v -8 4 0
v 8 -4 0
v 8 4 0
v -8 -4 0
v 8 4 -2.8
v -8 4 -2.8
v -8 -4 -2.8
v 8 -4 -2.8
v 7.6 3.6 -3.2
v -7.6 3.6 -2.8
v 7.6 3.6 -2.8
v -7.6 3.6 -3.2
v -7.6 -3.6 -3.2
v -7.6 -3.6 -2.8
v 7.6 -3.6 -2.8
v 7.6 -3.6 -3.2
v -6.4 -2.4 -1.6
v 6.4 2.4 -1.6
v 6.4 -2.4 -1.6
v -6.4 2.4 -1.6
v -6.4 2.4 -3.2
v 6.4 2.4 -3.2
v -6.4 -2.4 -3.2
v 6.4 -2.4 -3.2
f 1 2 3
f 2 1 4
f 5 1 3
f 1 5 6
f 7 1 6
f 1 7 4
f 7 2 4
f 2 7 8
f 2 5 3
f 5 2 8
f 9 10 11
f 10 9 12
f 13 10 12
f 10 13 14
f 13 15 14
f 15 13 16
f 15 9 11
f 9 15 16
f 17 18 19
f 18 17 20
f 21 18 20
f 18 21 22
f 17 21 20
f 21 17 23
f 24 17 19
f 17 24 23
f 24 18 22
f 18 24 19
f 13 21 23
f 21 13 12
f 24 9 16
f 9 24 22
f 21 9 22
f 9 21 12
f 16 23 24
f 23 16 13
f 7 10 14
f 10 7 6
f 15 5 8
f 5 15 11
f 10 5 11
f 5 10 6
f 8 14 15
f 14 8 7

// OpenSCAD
// file: ../p/4-4edge.scad
use <../lib.scad>
$fa=1; $fs=0.2;
function ldraw_lib__4_4edge(realsolid=false) = [
// 0 Circle 1.0
// 0 Name: 4-4edge.dat
// 0 Author: James Jessiman
// 0 !LDRAW_ORG Primitive UPDATE 2017-01
// 0 !LICENSE Licensed under CC BY 2.0 and CC BY 4.0 : see CAreadme.txt
// 
// 0 BFC CERTIFY CCW
  [0,"BFC","CERTIFY"],
  [0,"BFC","CCW"],
// 
// 0 !HISTORY 1998-12-15 [PTadmin] Official Update 1998-10
// 0 !HISTORY 2005-12-28 [PTadmin] Official Update 2005-01
// 0 !HISTORY 2007-06-24 [PTadmin] Header formatted for Contributor Agreement
// 0 !HISTORY 2008-07-01 [PTadmin] Official Update 2008-01
// 0 !HISTORY 2017-01-15 [Steffen] BFCed
// 0 !HISTORY 2017-12-30 [PTadmin] Official Update 2017-01
// 
// 
// 2 24 1 0 0 0.9239 0 0.3827
  [2,24,1,0,0,0.9239,0,0.3827],
// 2 24 0.9239 0 0.3827 0.7071 0 0.7071
  [2,24,0.9239,0,0.3827,0.7071,0,0.7071],
// 2 24 0.7071 0 0.7071 0.3827 0 0.9239
  [2,24,0.7071,0,0.7071,0.3827,0,0.9239],
// 2 24 0.3827 0 0.9239 0 0 1
  [2,24,0.3827,0,0.9239,0,0,1],
// 2 24 0 0 1 -0.3827 0 0.9239
  [2,24,0,0,1,-0.3827,0,0.9239],
// 2 24 -0.3827 0 0.9239 -0.7071 0 0.7071
  [2,24,-0.3827,0,0.9239,-0.7071,0,0.7071],
// 2 24 -0.7071 0 0.7071 -0.9239 0 0.3827
  [2,24,-0.7071,0,0.7071,-0.9239,0,0.3827],
// 2 24 -0.9239 0 0.3827 -1 0 -0
  [2,24,-0.9239,0,0.3827,-1,0,-0],
// 2 24 -1 0 -0 -0.9239 0 -0.3827
  [2,24,-1,0,-0,-0.9239,0,-0.3827],
// 2 24 -0.9239 0 -0.3827 -0.7071 0 -0.7071
  [2,24,-0.9239,0,-0.3827,-0.7071,0,-0.7071],
// 2 24 -0.7071 0 -0.7071 -0.3827 0 -0.9239
  [2,24,-0.7071,0,-0.7071,-0.3827,0,-0.9239],
// 2 24 -0.3827 0 -0.9239 0 0 -1
  [2,24,-0.3827,0,-0.9239,0,0,-1],
// 2 24 0 0 -1 0.3827 0 -0.9239
  [2,24,0,0,-1,0.3827,0,-0.9239],
// 2 24 0.3827 0 -0.9239 0.7071 0 -0.7071
  [2,24,0.3827,0,-0.9239,0.7071,0,-0.7071],
// 2 24 0.7071 0 -0.7071 0.9239 0 -0.3827
  [2,24,0.7071,0,-0.7071,0.9239,0,-0.3827],
// 2 24 0.9239 0 -0.3827 1 0 0
  [2,24,0.9239,0,-0.3827,1,0,0],
];
module ldraw_lib__4_4edge(step=0, col=false, unit=2/5, alt=false, line=0.2, solid=!$preview)
    makepoly(ldraw_lib__4_4edge(solid), step=step, col=col, unit=unit, alt=alt, line=line, solid=solid);
ldraw_lib__4_4edge(line=0.2);
// file: ../p/4-4disc.scad
use <../lib.scad>
$fa=1; $fs=0.2;
function ldraw_lib__4_4disc(realsolid=false) = [
// 0 Disc 1.0
// 0 Name: 4-4disc.dat
// 0 Author: James Jessiman
// 0 !LDRAW_ORG Primitive UPDATE 2002-02
// 0 !LICENSE Licensed under CC BY 2.0 and CC BY 4.0 : see CAreadme.txt
// 
// 0 BFC CERTIFY CCW
  [0,"BFC","CERTIFY"],
  [0,"BFC","CCW"],
// 
// 0 !HISTORY 1998-12-15 [PTadmin] Official Update 1998-10
// 0 !HISTORY 2002-03-23 [sbliss] Added BFC statement
// 0 !HISTORY 2002-04-25 [PTadmin] Official Update 2002-02
// 0 !HISTORY 2007-06-24 [PTadmin] Header formatted for Contributor Agreement
// 0 !HISTORY 2008-07-01 [PTadmin] Official Update 2008-01
// 
// 
// 3 16 0 0 0 1 0 0 0.9239 0 0.3827
  [3,16,0,0,0,1,0,0,0.9239,0,0.3827],
// 3 16 0 0 0 0.9239 0 0.3827 0.7071 0 0.7071
  [3,16,0,0,0,0.9239,0,0.3827,0.7071,0,0.7071],
// 3 16 0 0 0 0.7071 0 0.7071 0.3827 0 0.9239
  [3,16,0,0,0,0.7071,0,0.7071,0.3827,0,0.9239],
// 3 16 0 0 0 0.3827 0 0.9239 0 0 1
  [3,16,0,0,0,0.3827,0,0.9239,0,0,1],
// 3 16 0 0 0 0 0 1 -0.3827 0 0.9239
  [3,16,0,0,0,0,0,1,-0.3827,0,0.9239],
// 3 16 0 0 0 -0.3827 0 0.9239 -0.7071 0 0.7071
  [3,16,0,0,0,-0.3827,0,0.9239,-0.7071,0,0.7071],
// 3 16 0 0 0 -0.7071 0 0.7071 -0.9239 0 0.3827
  [3,16,0,0,0,-0.7071,0,0.7071,-0.9239,0,0.3827],
// 3 16 0 0 0 -0.9239 0 0.3827 -1 0 -0
  [3,16,0,0,0,-0.9239,0,0.3827,-1,0,-0],
// 3 16 0 0 0 -1 0 -0 -0.9239 0 -0.3827
  [3,16,0,0,0,-1,0,-0,-0.9239,0,-0.3827],
// 3 16 0 0 0 -0.9239 0 -0.3827 -0.7071 0 -0.7071
  [3,16,0,0,0,-0.9239,0,-0.3827,-0.7071,0,-0.7071],
// 3 16 0 0 0 -0.7071 0 -0.7071 -0.3827 0 -0.9239
  [3,16,0,0,0,-0.7071,0,-0.7071,-0.3827,0,-0.9239],
// 3 16 0 0 0 -0.3827 0 -0.9239 0 0 -1
  [3,16,0,0,0,-0.3827,0,-0.9239,0,0,-1],
// 3 16 0 0 0 0 0 -1 0.3827 0 -0.9239
  [3,16,0,0,0,0,0,-1,0.3827,0,-0.9239],
// 3 16 0 0 0 0.3827 0 -0.9239 0.7071 0 -0.7071
  [3,16,0,0,0,0.3827,0,-0.9239,0.7071,0,-0.7071],
// 3 16 0 0 0 0.7071 0 -0.7071 0.9239 0 -0.3827
  [3,16,0,0,0,0.7071,0,-0.7071,0.9239,0,-0.3827],
// 3 16 0 0 0 0.9239 0 -0.3827 1 0 0
  [3,16,0,0,0,0.9239,0,-0.3827,1,0,0],
// 0
];
module ldraw_lib__4_4disc(step=0, col=false, unit=2/5, alt=false, line=0.2, solid=!$preview)
    makepoly(ldraw_lib__4_4disc(solid), step=step, col=col, unit=unit, alt=alt, line=line, solid=solid);
ldraw_lib__4_4disc(line=0.2);
// file: ../p/4-4cyli.scad
use <../lib.scad>
$fa=1; $fs=0.2;
function ldraw_lib__4_4cyli(realsolid=false) = [
// 0 Cylinder 1.0
// 0 Name: 4-4cyli.dat
// 0 Author: James Jessiman
// 0 !LDRAW_ORG Primitive UPDATE 2005-01
// 0 !LICENSE Licensed under CC BY 2.0 and CC BY 4.0 : see CAreadme.txt
// 
// 0 BFC CERTIFY CCW
  [0,"BFC","CERTIFY"],
  [0,"BFC","CCW"],
// 
// 0 !HISTORY 1998-12-15 [PTadmin] Official Update 1998-10
// 0 !HISTORY 2002-03-23 [sbliss] Added BFC statement; merged headers from files in distributions LDraw 0.27 and Complete.
// 0 !HISTORY 2002-04-25 [PTadmin] Official Update 2002-02
// 0 !HISTORY 2004-12-14 [guyvivan] BFC CCW
// 0 !HISTORY 2005-12-28 [PTadmin] Official Update 2005-01
// 0 !HISTORY 2007-06-24 [PTadmin] Header formatted for Contributor Agreement
// 0 !HISTORY 2008-07-01 [PTadmin] Official Update 2008-01
// 
// 
// 4 16 1 1 0 0.9239 1 0.3827 0.9239 0 0.3827 1 0 0
  [4,16,1,1,0,0.9239,1,0.3827,0.9239,0,0.3827,1,0,0],
// 5 24 1 0 0 1 1 0 0.9239 0 0.3827 0.9239 0 -0.3827
  [5,24,1,0,0,1,1,0,0.9239,0,0.3827,0.9239,0,-0.3827],
// 4 16 0.9239 1 0.3827 0.7071 1 0.7071 0.7071 0 0.7071 0.9239 0 0.3827
  [4,16,0.9239,1,0.3827,0.7071,1,0.7071,0.7071,0,0.7071,0.9239,0,0.3827],
// 5 24 0.9239 0 0.3827 0.9239 1 0.3827 0.7071 0 0.7071 1 0 0
  [5,24,0.9239,0,0.3827,0.9239,1,0.3827,0.7071,0,0.7071,1,0,0],
// 4 16 0.7071 1 0.7071 0.3827 1 0.9239 0.3827 0 0.9239 0.7071 0 0.7071
  [4,16,0.7071,1,0.7071,0.3827,1,0.9239,0.3827,0,0.9239,0.7071,0,0.7071],
// 5 24 0.7071 0 0.7071 0.7071 1 0.7071 0.3827 0 0.9239 0.9239 0 0.3827
  [5,24,0.7071,0,0.7071,0.7071,1,0.7071,0.3827,0,0.9239,0.9239,0,0.3827],
// 4 16 0.3827 1 0.9239 0 1 1 0 0 1 0.3827 0 0.9239
  [4,16,0.3827,1,0.9239,0,1,1,0,0,1,0.3827,0,0.9239],
// 5 24 0.3827 0 0.9239 0.3827 1 0.9239 0 0 1 0.7071 0 0.7071
  [5,24,0.3827,0,0.9239,0.3827,1,0.9239,0,0,1,0.7071,0,0.7071],
// 4 16 0 1 1 -0.3827 1 0.9239 -0.3827 0 0.9239 0 0 1
  [4,16,0,1,1,-0.3827,1,0.9239,-0.3827,0,0.9239,0,0,1],
// 5 24 0 0 1 0 1 1 -0.3827 0 0.9239 0.3827 0 0.9239
  [5,24,0,0,1,0,1,1,-0.3827,0,0.9239,0.3827,0,0.9239],
// 4 16 -0.3827 1 0.9239 -0.7071 1 0.7071 -0.7071 0 0.7071 -0.3827 0 0.9239
  [4,16,-0.3827,1,0.9239,-0.7071,1,0.7071,-0.7071,0,0.7071,-0.3827,0,0.9239],
// 5 24 -0.3827 0 0.9239 -0.3827 1 0.9239 -0.7071 0 0.7071 0 0 1
  [5,24,-0.3827,0,0.9239,-0.3827,1,0.9239,-0.7071,0,0.7071,0,0,1],
// 4 16 -0.7071 1 0.7071 -0.9239 1 0.3827 -0.9239 0 0.3827 -0.7071 0 0.7071
  [4,16,-0.7071,1,0.7071,-0.9239,1,0.3827,-0.9239,0,0.3827,-0.7071,0,0.7071],
// 5 24 -0.7071 0 0.7071 -0.7071 1 0.7071 -0.9239 0 0.3827 -0.3827 0 0.9239
  [5,24,-0.7071,0,0.7071,-0.7071,1,0.7071,-0.9239,0,0.3827,-0.3827,0,0.9239],
// 4 16 -0.9239 1 0.3827 -1 1 0 -1 0 0 -0.9239 0 0.3827
  [4,16,-0.9239,1,0.3827,-1,1,0,-1,0,0,-0.9239,0,0.3827],
// 5 24 -0.9239 0 0.3827 -0.9239 1 0.3827 -1 0 0 -0.7071 0 0.7071
  [5,24,-0.9239,0,0.3827,-0.9239,1,0.3827,-1,0,0,-0.7071,0,0.7071],
// 4 16 -1 1 0 -0.9239 1 -0.3827 -0.9239 0 -0.3827 -1 0 0
  [4,16,-1,1,0,-0.9239,1,-0.3827,-0.9239,0,-0.3827,-1,0,0],
// 5 24 -1 0 0 -1 1 0 -0.9239 0 -0.3827 -0.9239 0 0.3827
  [5,24,-1,0,0,-1,1,0,-0.9239,0,-0.3827,-0.9239,0,0.3827],
// 4 16 -0.9239 1 -0.3827 -0.7071 1 -0.7071 -0.7071 0 -0.7071 -0.9239 0 -0.3827
  [4,16,-0.9239,1,-0.3827,-0.7071,1,-0.7071,-0.7071,0,-0.7071,-0.9239,0,-0.3827],
// 5 24 -0.9239 0 -0.3827 -0.9239 1 -0.3827 -0.7071 0 -0.7071 -1 0 0
  [5,24,-0.9239,0,-0.3827,-0.9239,1,-0.3827,-0.7071,0,-0.7071,-1,0,0],
// 4 16 -0.7071 1 -0.7071 -0.3827 1 -0.9239 -0.3827 0 -0.9239 -0.7071 0 -0.7071
  [4,16,-0.7071,1,-0.7071,-0.3827,1,-0.9239,-0.3827,0,-0.9239,-0.7071,0,-0.7071],
// 5 24 -0.7071 0 -0.7071 -0.7071 1 -0.7071 -0.3827 0 -0.9239 -0.9239 0 -0.3827
  [5,24,-0.7071,0,-0.7071,-0.7071,1,-0.7071,-0.3827,0,-0.9239,-0.9239,0,-0.3827],
// 4 16 -0.3827 1 -0.9239 0 1 -1 0 0 -1 -0.3827 0 -0.9239
  [4,16,-0.3827,1,-0.9239,0,1,-1,0,0,-1,-0.3827,0,-0.9239],
// 5 24 -0.3827 0 -0.9239 -0.3827 1 -0.9239 0 0 -1 -0.7071 0 -0.7071
  [5,24,-0.3827,0,-0.9239,-0.3827,1,-0.9239,0,0,-1,-0.7071,0,-0.7071],
// 4 16 0 1 -1 0.3827 1 -0.9239 0.3827 0 -0.9239 0 0 -1
  [4,16,0,1,-1,0.3827,1,-0.9239,0.3827,0,-0.9239,0,0,-1],
// 5 24 0 0 -1 0 1 -1 0.3827 0 -0.9239 -0.3827 0 -0.9239
  [5,24,0,0,-1,0,1,-1,0.3827,0,-0.9239,-0.3827,0,-0.9239],
// 4 16 0.3827 1 -0.9239 0.7071 1 -0.7071 0.7071 0 -0.7071 0.3827 0 -0.9239
  [4,16,0.3827,1,-0.9239,0.7071,1,-0.7071,0.7071,0,-0.7071,0.3827,0,-0.9239],
// 5 24 0.3827 0 -0.9239 0.3827 1 -0.9239 0.7071 0 -0.7071 0 0 -1
  [5,24,0.3827,0,-0.9239,0.3827,1,-0.9239,0.7071,0,-0.7071,0,0,-1],
// 4 16 0.7071 1 -0.7071 0.9239 1 -0.3827 0.9239 0 -0.3827 0.7071 0 -0.7071
  [4,16,0.7071,1,-0.7071,0.9239,1,-0.3827,0.9239,0,-0.3827,0.7071,0,-0.7071],
// 5 24 0.7071 0 -0.7071 0.7071 1 -0.7071 0.9239 0 -0.3827 0.3827 0 -0.9239
  [5,24,0.7071,0,-0.7071,0.7071,1,-0.7071,0.9239,0,-0.3827,0.3827,0,-0.9239],
// 4 16 0.9239 1 -0.3827 1 1 0 1 0 0 0.9239 0 -0.3827
  [4,16,0.9239,1,-0.3827,1,1,0,1,0,0,0.9239,0,-0.3827],
// 5 24 0.9239 0 -0.3827 0.9239 1 -0.3827 1 0 0 0.7071 0 -0.7071
  [5,24,0.9239,0,-0.3827,0.9239,1,-0.3827,1,0,0,0.7071,0,-0.7071],
// 0
];
module ldraw_lib__4_4cyli(step=0, col=false, unit=2/5, alt=false, line=0.2, solid=!$preview)
    makepoly(ldraw_lib__4_4cyli(solid), step=step, col=col, unit=unit, alt=alt, line=line, solid=solid);
ldraw_lib__4_4cyli(line=0.2);
// file: ../p/stud3.scad
use <../lib.scad>
use <4-4cyli.scad>
use <4-4disc.scad>
use <4-4edge.scad>
$fa=1; $fs=0.2;
function ldraw_lib__stud3(realsolid=false) = realsolid ? 
    [openscad(translate([0,0,-eps()], o=cylinder(4+eps(), r=4)),2)] : [
// 0 Stud Tube Solid
// 0 Name: stud3.dat
// 0 Author: James Jessiman
// 0 !LDRAW_ORG Primitive UPDATE 2012-01
// 0 !LICENSE Licensed under CC BY 2.0 and CC BY 4.0 : see CAreadme.txt
// 
// 0 BFC CERTIFY CCW
  [0,"BFC","CERTIFY"],
  [0,"BFC","CCW"],
// 
// 0 !HISTORY 2002-04-04 [sbliss] Modified for BFC compliance
// 0 !HISTORY 2002-04-25 [PTadmin] Official Update 2002-02
// 0 !HISTORY 2007-06-24 [PTadmin] Header formatted for Contributor Agreement
// 0 !HISTORY 2008-07-01 [PTadmin] Official Update 2008-01
// 0 !HISTORY 2012-02-16 [Philo] Changed to CCW
// 0 !HISTORY 2012-03-30 [PTadmin] Official Update 2012-01
// 
// 
// 1 16 0 -4 0 4 0 0 0 1 0 0 0 4 4-4edge.dat
  [1,16,0,-4,0,4,0,0,0,1,0,0,0,4, ldraw_lib__4_4edge(realsolid)],
// 1 16 0 0 0 4 0 0 0 1 0 0 0 4 4-4edge.dat
  [1,16,0,0,0,4,0,0,0,1,0,0,0,4, ldraw_lib__4_4edge(realsolid)],
// 1 16 0 -4 0 4 0 0 0 1 0 0 0 4 4-4disc.dat
  [1,16,0,-4,0,4,0,0,0,1,0,0,0,4, ldraw_lib__4_4disc(realsolid)],
// 1 16 0 -4 0 4 0 0 0 4 0 0 0 4 4-4cyli.dat
  [1,16,0,-4,0,4,0,0,0,4,0,0,0,4, ldraw_lib__4_4cyli(realsolid)],
];
module ldraw_lib__stud3(step=0, col=false, unit=2/5, alt=false, line=0.2, solid=!$preview)
    makepoly(ldraw_lib__stud3(solid), step=step, col=col, unit=unit, alt=alt, line=line, solid=solid);
ldraw_lib__stud3(line=0.2);
// file: ../p/stud.scad
use <../lib.scad>
use <4-4cyli.scad>
use <4-4disc.scad>
use <4-4edge.scad>
$fa=1; $fs=0.2;
function ldraw_lib__stud(realsolid=false) = realsolid ? 
    [openscad(translate([0,0,-eps()], o=cylinder(4+eps(), r=6)),2)] : [
// 0 Stud
// 0 Name: stud.dat
// 0 Author: James Jessiman
// 0 !LDRAW_ORG Primitive UPDATE 2012-01
// 0 !LICENSE Licensed under CC BY 2.0 and CC BY 4.0 : see CAreadme.txt
// 
// 0 BFC CERTIFY CCW
  [0,"BFC","CERTIFY"],
  [0,"BFC","CCW"],
// 
// 0 !HISTORY 2002-04-04 [sbliss] Modified for BFC compliance
// 0 !HISTORY 2002-04-25 [PTadmin] Official Update 2002-02
// 0 !HISTORY 2007-06-24 [PTadmin] Header formatted for Contributor Agreement
// 0 !HISTORY 2008-07-01 [PTadmin] Official Update 2008-01
// 0 !HISTORY 2012-02-16 [Philo] Changed to CCW
// 0 !HISTORY 2012-03-30 [PTadmin] Official Update 2012-01
// 
// 
// 1 16 0 0 0 6 0 0 0 1 0 0 0 6 4-4edge.dat
  [1,16,0,0,0,6,0,0,0,1,0,0,0,6, ldraw_lib__4_4edge(realsolid)],
// 1 16 0 -4 0 6 0 0 0 1 0 0 0 6 4-4edge.dat
  [1,16,0,-4,0,6,0,0,0,1,0,0,0,6, ldraw_lib__4_4edge(realsolid)],
// 1 16 0 0 0 6 0 0 0 -4 0 0 0 6 4-4cyli.dat
  [1,16,0,0,0,6,0,0,0,-4,0,0,0,6, ldraw_lib__4_4cyli(realsolid)],
// 1 16 0 -4 0 6 0 0 0 1 0 0 0 6 4-4disc.dat
  [1,16,0,-4,0,6,0,0,0,1,0,0,0,6, ldraw_lib__4_4disc(realsolid)],
];
module ldraw_lib__stud(step=0, col=false, unit=2/5, alt=false, line=0.2, solid=!$preview)
    makepoly(ldraw_lib__stud(solid), step=step, col=col, unit=unit, alt=alt, line=line, solid=solid);
ldraw_lib__stud(line=0.2);
// file: ../p/box4t.scad
use <../lib.scad>
$fa=1; $fs=0.2;
function ldraw_lib__box4t(realsolid=false) = [
// 0 Box with 4 Adjacent Faces and All Edges
// 0 Name: box4t.dat
// 0 Author: Tore Eriksson [Tore_Eriksson]
// 0 !LDRAW_ORG Primitive UPDATE 2003-02
// 0 !LICENSE Licensed under CC BY 2.0 and CC BY 4.0 : see CAreadme.txt
// 
// 0 BFC CERTIFY CCW
  [0,"BFC","CERTIFY"],
  [0,"BFC","CCW"],
// 
// 0 !HISTORY 1997-09-29 [PTadmin] Official Update 1997-15
// 0 !HISTORY 2002-08-31 [izanette] Modified with WINDZ for BFC compliance
// 0 !HISTORY 2003-08-01 [PTadmin] Official Update 2003-02
// 0 !HISTORY 2007-06-24 [PTadmin] Header formatted for Contributor Agreement
// 0 !HISTORY 2008-07-01 [PTadmin] Official Update 2008-01
// 
// 
// 2 24 1 1 1 -1 1 1
  [2,24,1,1,1,-1,1,1],
// 2 24 -1 1 1 -1 1 -1
  [2,24,-1,1,1,-1,1,-1],
// 2 24 -1 1 -1 1 1 -1
  [2,24,-1,1,-1,1,1,-1],
// 2 24 1 1 -1 1 1 1
  [2,24,1,1,-1,1,1,1],
// 2 24 1 0 1 -1 0 1
  [2,24,1,0,1,-1,0,1],
// 2 24 -1 0 1 -1 0 -1
  [2,24,-1,0,1,-1,0,-1],
// 2 24 -1 0 -1 1 0 -1
  [2,24,-1,0,-1,1,0,-1],
// 2 24 1 0 -1 1 0 1
  [2,24,1,0,-1,1,0,1],
// 2 24 1 0 1 1 1 1
  [2,24,1,0,1,1,1,1],
// 2 24 -1 0 1 -1 1 1
  [2,24,-1,0,1,-1,1,1],
// 2 24 1 0 -1 1 1 -1
  [2,24,1,0,-1,1,1,-1],
// 2 24 -1 0 -1 -1 1 -1
  [2,24,-1,0,-1,-1,1,-1],
// 4 16 1 1 1 1 1 -1 -1 1 -1 -1 1 1
  [4,16,1,1,1,1,1,-1,-1,1,-1,-1,1,1],
// 4 16 1 1 1 -1 1 1 -1 0 1 1 0 1
  [4,16,1,1,1,-1,1,1,-1,0,1,1,0,1],
// 4 16 -1 1 1 -1 1 -1 -1 0 -1 -1 0 1
  [4,16,-1,1,1,-1,1,-1,-1,0,-1,-1,0,1],
// 0 4 16 -1 1 -1 -1 0 -1 1 0 -1 1 1 -1
// 4 16 1 1 -1 1 1 1 1 0 1 1 0 -1
  [4,16,1,1,-1,1,1,1,1,0,1,1,0,-1],
// 0
];
module ldraw_lib__box4t(step=0, col=false, unit=2/5, alt=false, line=0.2, solid=!$preview)
    makepoly(ldraw_lib__box4t(solid), step=step, col=col, unit=unit, alt=alt, line=line, solid=solid);
ldraw_lib__box4t(line=0.2);
// file: ../p/box5.scad
use <../lib.scad>
$fa=1; $fs=0.2;
function ldraw_lib__box5(realsolid=false) = [
// 0 Box with 5 Faces and All Edges
// 0 Name: box5.dat
// 0 Author: James Jessiman
// 0 !LDRAW_ORG Primitive UPDATE 2012-01
// 0 !LICENSE Licensed under CC BY 2.0 and CC BY 4.0 : see CAreadme.txt
// 
// 0 BFC CERTIFY CCW
  [0,"BFC","CERTIFY"],
  [0,"BFC","CCW"],
// 
// 0 !HISTORY 2002-04-03 [sbliss] Modified for BFC compliance
// 0 !HISTORY 2002-04-25 [PTadmin] Official Update 2002-02
// 0 !HISTORY 2007-06-24 [PTadmin] Header formatted for Contributor Agreement
// 0 !HISTORY 2008-07-01 [PTadmin] Official Update 2008-01
// 0 !HISTORY 2012-02-16 [Philo] Changed to CCW
// 0 !HISTORY 2012-03-30 [PTadmin] Official Update 2012-01
// 
// 
// 2 24 1 1 1 -1 1 1
  [2,24,1,1,1,-1,1,1],
// 2 24 -1 1 1 -1 1 -1
  [2,24,-1,1,1,-1,1,-1],
// 2 24 -1 1 -1 1 1 -1
  [2,24,-1,1,-1,1,1,-1],
// 2 24 1 1 -1 1 1 1
  [2,24,1,1,-1,1,1,1],
// 2 24 1 0 1 -1 0 1
  [2,24,1,0,1,-1,0,1],
// 2 24 -1 0 1 -1 0 -1
  [2,24,-1,0,1,-1,0,-1],
// 2 24 -1 0 -1 1 0 -1
  [2,24,-1,0,-1,1,0,-1],
// 2 24 1 0 -1 1 0 1
  [2,24,1,0,-1,1,0,1],
// 2 24 1 0 1 1 1 1
  [2,24,1,0,1,1,1,1],
// 2 24 -1 0 1 -1 1 1
  [2,24,-1,0,1,-1,1,1],
// 2 24 1 0 -1 1 1 -1
  [2,24,1,0,-1,1,1,-1],
// 2 24 -1 0 -1 -1 1 -1
  [2,24,-1,0,-1,-1,1,-1],
// 4 16 -1 1 1 1 1 1 1 1 -1 -1 1 -1
  [4,16,-1,1,1,1,1,1,1,1,-1,-1,1,-1],
// 4 16 -1 1 1 -1 0 1 1 0 1 1 1 1
  [4,16,-1,1,1,-1,0,1,1,0,1,1,1,1],
// 4 16 -1 1 -1 -1 0 -1 -1 0 1 -1 1 1
  [4,16,-1,1,-1,-1,0,-1,-1,0,1,-1,1,1],
// 4 16 1 1 -1 1 0 -1 -1 0 -1 -1 1 -1
  [4,16,1,1,-1,1,0,-1,-1,0,-1,-1,1,-1],
// 4 16 1 1 1 1 0 1 1 0 -1 1 1 -1
  [4,16,1,1,1,1,0,1,1,0,-1,1,1,-1],
];
module ldraw_lib__box5(step=0, col=false, unit=2/5, alt=false, line=0.2, solid=!$preview)
    makepoly(ldraw_lib__box5(solid), step=step, col=col, unit=unit, alt=alt, line=line, solid=solid);
ldraw_lib__box5(line=0.2);
// file: ../p/box4.scad
use <../lib.scad>
$fa=1; $fs=0.2;
function ldraw_lib__box4(realsolid=false) = [
// 0 Box with 4 Faces (2 Parallel Pairs) and All Edges
// 0 Name: box4.dat
// 0 Author: James Jessiman
// 0 !LDRAW_ORG Primitive UPDATE 2012-01
// 0 !LICENSE Licensed under CC BY 2.0 and CC BY 4.0 : see CAreadme.txt
// 
// 0 BFC CERTIFY CCW
  [0,"BFC","CERTIFY"],
  [0,"BFC","CCW"],
// 
// 0 !HISTORY 2002-04-03 [sbliss] Modified for BFC compliance
// 0 !HISTORY 2002-04-25 [PTadmin] Official Update 2002-02
// 0 !HISTORY 2007-06-24 [PTadmin] Header formatted for Contributor Agreement
// 0 !HISTORY 2008-07-01 [PTadmin] Official Update 2008-01
// 0 !HISTORY 2012-02-16 [Philo] Changed to CCW
// 0 !HISTORY 2012-03-30 [PTadmin] Official Update 2012-01
// 
// 
// 2 24 1 1 1 -1 1 1
  [2,24,1,1,1,-1,1,1],
// 2 24 -1 1 1 -1 1 -1
  [2,24,-1,1,1,-1,1,-1],
// 2 24 -1 1 -1 1 1 -1
  [2,24,-1,1,-1,1,1,-1],
// 2 24 1 1 -1 1 1 1
  [2,24,1,1,-1,1,1,1],
// 2 24 1 0 1 -1 0 1
  [2,24,1,0,1,-1,0,1],
// 2 24 -1 0 1 -1 0 -1
  [2,24,-1,0,1,-1,0,-1],
// 2 24 -1 0 -1 1 0 -1
  [2,24,-1,0,-1,1,0,-1],
// 2 24 1 0 -1 1 0 1
  [2,24,1,0,-1,1,0,1],
// 2 24 1 0 1 1 1 1
  [2,24,1,0,1,1,1,1],
// 2 24 -1 0 1 -1 1 1
  [2,24,-1,0,1,-1,1,1],
// 2 24 1 0 -1 1 1 -1
  [2,24,1,0,-1,1,1,-1],
// 2 24 -1 0 -1 -1 1 -1
  [2,24,-1,0,-1,-1,1,-1],
// 4 16 -1 1 1 -1 0 1 1 0 1 1 1 1
  [4,16,-1,1,1,-1,0,1,1,0,1,1,1,1],
// 4 16 -1 1 -1 -1 0 -1 -1 0 1 -1 1 1
  [4,16,-1,1,-1,-1,0,-1,-1,0,1,-1,1,1],
// 4 16 1 1 -1 1 0 -1 -1 0 -1 -1 1 -1
  [4,16,1,1,-1,1,0,-1,-1,0,-1,-1,1,-1],
// 4 16 1 1 1 1 0 1 1 0 -1 1 1 -1
  [4,16,1,1,1,1,0,1,1,0,-1,1,1,-1],
];
module ldraw_lib__box4(step=0, col=false, unit=2/5, alt=false, line=0.2, solid=!$preview)
    makepoly(ldraw_lib__box4(solid), step=step, col=col, unit=unit, alt=alt, line=line, solid=solid);
ldraw_lib__box4(line=0.2);
// file: s/3004s01.scad
use <../../lib.scad>
use <../../p/box4t.scad>
use <../../p/box5.scad>
use <../../p/stud.scad>
use <../../p/stud3.scad>
$fa=1; $fs=0.2;
function ldraw_lib__s__3004s01(realsolid=false) = [
// 0 ~Brick  1 x  2 without Front Face
// 0 Name: s\3004s01.dat
// 0 Author: James Jessiman
// 0 !LDRAW_ORG Subpart UPDATE 2003-03
// 0 !LICENSE Licensed under CC BY 2.0 and CC BY 4.0 : see CAreadme.txt
// 
// 0 BFC CERTIFY CCW
  [0,"BFC","CERTIFY"],
  [0,"BFC","CCW"],
// 
// 0 !HISTORY 2003-09-07 [jriley] Subfiling, BFC
// 0 !HISTORY 2003-12-19 [PTadmin] Official Update 2003-03
// 0 !HISTORY 2007-08-29 [PTadmin] Header formatted for Contributor Agreement
// 0 !HISTORY 2008-07-01 [PTadmin] Official Update 2008-01
// 
// 
// 1 16 0 4 0 1 0 0 0 -5 0 0 0 1 stud3.dat
  [1,16,0,4,0,1,0,0,0,-5,0,0,0,1, ldraw_lib__stud3(realsolid)],
// 0 BFC INVERTNEXT
  [0,"BFC","INVERTNEXT"],
// 1 16 0 24 0 16 0 0 0 -20 0 0 0 6 box5.dat
  [1,16,0,24,0,16,0,0,0,-20,0,0,0,6, ldraw_lib__box5(realsolid)],
// 4 16 20 24 10 16 24 6 -16 24 6 -20 24 10
  [4,16,20,24,10,16,24,6,-16,24,6,-20,24,10],
// 4 16 -20 24 10 -16 24 6 -16 24 -6 -20 24 -10
  [4,16,-20,24,10,-16,24,6,-16,24,-6,-20,24,-10],
// 4 16 -20 24 -10 -16 24 -6 16 24 -6 20 24 -10
  [4,16,-20,24,-10,-16,24,-6,16,24,-6,20,24,-10],
// 4 16 20 24 -10 16 24 -6 16 24 6 20 24 10
  [4,16,20,24,-10,16,24,-6,16,24,6,20,24,10],
// 1 16 0 24 0 20 0 0 0 -24 0 0 0 10 box4t.dat
  [1,16,0,24,0,20,0,0,0,-24,0,0,0,10, ldraw_lib__box4t(realsolid)],
// 1 16 10 0 0 1 0 0 0 1 0 0 0 1 stud.dat
  [1,16,10,0,0,1,0,0,0,1,0,0,0,1, ldraw_lib__stud(realsolid)],
// 1 16 -10 0 0 1 0 0 0 1 0 0 0 1 stud.dat
  [1,16,-10,0,0,1,0,0,0,1,0,0,0,1, ldraw_lib__stud(realsolid)],
// 0
];
module ldraw_lib__s__3004s01(step=0, col=false, unit=2/5, alt=false, line=0.2, solid=!$preview)
    makepoly(ldraw_lib__s__3004s01(solid), step=step, col=col, unit=unit, alt=alt, line=line, solid=solid);
ldraw_lib__s__3004s01(line=0.2);
// file: s/3069bs01.scad
use <../../lib.scad>
use <../../p/box4.scad>
use <../../p/box5.scad>
$fa=1; $fs=0.2;
function ldraw_lib__s__3069bs01(realsolid=false) = [
// 0 ~Tile  1 x  2 with Groove without Top Face
// 0 Name: s\3069bs01.dat
// 0 Author: Santeri Piippo [arezey]
// 0 !LDRAW_ORG Subpart UPDATE 2010-02
// 0 !LICENSE Licensed under CC BY 2.0 and CC BY 4.0 : see CAreadme.txt
// 
// 0 BFC CERTIFY CCW
  [0,"BFC","CERTIFY"],
  [0,"BFC","CCW"],
// 
// 0 !HISTORY 2010-07-05 [PTadmin] Official Update 2010-02
// 
// 
// 1 16 0 0 0 20 0 0 0 7 0 0 0 10 box4.dat
  [1,16,0,0,0,20,0,0,0,7,0,0,0,10, ldraw_lib__box4(realsolid)],
// 1 16 0 7 0 19 0 0 0 1 0 0 0 9 box4.dat
  [1,16,0,7,0,19,0,0,0,1,0,0,0,9, ldraw_lib__box4(realsolid)],
// 0 BFC INVERTNEXT
  [0,"BFC","INVERTNEXT"],
// 1 16 0 8 0 16 0 0 0 -4 0 0 0 6 box5.dat
  [1,16,0,8,0,16,0,0,0,-4,0,0,0,6, ldraw_lib__box5(realsolid)],
// 4 16 -19 8 9 -16 8 6 -16 8 -6 -19 8 -9
  [4,16,-19,8,9,-16,8,6,-16,8,-6,-19,8,-9],
// 4 16 19 8 -9 16 8 -6 16 8 6 19 8 9
  [4,16,19,8,-9,16,8,-6,16,8,6,19,8,9],
// 4 16 19 8 9 16 8 6 -16 8 6 -19 8 9
  [4,16,19,8,9,16,8,6,-16,8,6,-19,8,9],
// 4 16 -19 8 -9 -16 8 -6 16 8 -6 19 8 -9
  [4,16,-19,8,-9,-16,8,-6,16,8,-6,19,8,-9],
// 4 16 -20 7 10 -19 7 9 -19 7 -9 -20 7 -10
  [4,16,-20,7,10,-19,7,9,-19,7,-9,-20,7,-10],
// 4 16 20 7 -10 19 7 -9 19 7 9 20 7 10
  [4,16,20,7,-10,19,7,-9,19,7,9,20,7,10],
// 4 16 20 7 10 19 7 9 -19 7 9 -20 7 10
  [4,16,20,7,10,19,7,9,-19,7,9,-20,7,10],
// 4 16 -20 7 -10 -19 7 -9 19 7 -9 20 7 -10
  [4,16,-20,7,-10,-19,7,-9,19,7,-9,20,7,-10],
// 0 //
];
module ldraw_lib__s__3069bs01(step=0, col=false, unit=2/5, alt=false, line=0.2, solid=!$preview)
    makepoly(ldraw_lib__s__3069bs01(solid), step=step, col=col, unit=unit, alt=alt, line=line, solid=solid);
ldraw_lib__s__3069bs01(line=0.2);
// file: 3004.scad
use <../lib.scad>
use <s/3004s01.scad>
$fa=1; $fs=0.2;
function ldraw_lib__3004(realsolid=false) = [
// 0 Brick  1 x  2
// 0 Name: 3004.dat
// 0 Author: James Jessiman
// 0 !LDRAW_ORG Part UPDATE 2022-05
// 0 !LICENSE Licensed under CC BY 2.0 and CC BY 4.0 : see CAreadme.txt
// 
// 0 BFC CERTIFY CCW
  [0,"BFC","CERTIFY"],
  [0,"BFC","CCW"],
// 
// 0 !HISTORY 2001-10-26 [PTadmin] Official Update 2001-01
// 0 !HISTORY 2002-05-07 {unknown} BFC Certification
// 0 !HISTORY 2002-06-11 [PTadmin] Official Update 2002-03
// 0 !HISTORY 2007-05-07 [PTadmin] Header formatted for Contributor Agreement
// 0 !HISTORY 2008-07-01 [PTadmin] Official Update 2008-01
// 0 !HISTORY 2022-08-04 [MagFors] Using subfile
// 0 !HISTORY 2022-09-15 [PTadmin] Official Update 2022-05
// 
// 
// 1 16 0 0 0 1 0 0 0 1 0 0 0 1 s\3004s01.dat
  [1,16,0,0,0,1,0,0,0,1,0,0,0,1, ldraw_lib__s__3004s01(realsolid)],
// 4 16 -20 24 -10 20 24 -10 20 0 -10 -20 0 -10
  [4,16,-20,24,-10,20,24,-10,20,0,-10,-20,0,-10],
];
module ldraw_lib__3004(step=0, col=false, unit=2/5, alt=false, line=0.2, solid=!$preview)
    makepoly(ldraw_lib__3004(solid), step=step, col=col, unit=unit, alt=alt, line=line, solid=solid);
ldraw_lib__3004(line=0.2);
// file: 3069b.scad
use <../lib.scad>
use <s/3069bs01.scad>
$fa=1; $fs=0.2;
function ldraw_lib__3069b(realsolid=false) = [
// 0 Tile  1 x  2 with Groove
// 0 Name: 3069b.dat
// 0 Author: Santeri Piippo [arezey]
// 0 !LDRAW_ORG Part UPDATE 2010-02
// 0 !LICENSE Licensed under CC BY 2.0 and CC BY 4.0 : see CAreadme.txt
// 
// 0 BFC CERTIFY CCW
  [0,"BFC","CERTIFY"],
  [0,"BFC","CCW"],
// 
// 0 !HISTORY 2010-07-05 [PTadmin] Official Update 2010-02
// 
// 
// 4 16 20 0 -10 20 0 10 -20 0 10 -20 0 -10
  [4,16,20,0,-10,20,0,10,-20,0,10,-20,0,-10],
// 1 16 0 0 0 1 0 0 0 1 0 0 0 1 s\3069bs01.dat
  [1,16,0,0,0,1,0,0,0,1,0,0,0,1, ldraw_lib__s__3069bs01(realsolid)],
// 0 //
];
module ldraw_lib__3069b(step=0, col=false, unit=2/5, alt=false, line=0.2, solid=!$preview)
    makepoly(ldraw_lib__3069b(solid), step=step, col=col, unit=unit, alt=alt, line=line, solid=solid);
ldraw_lib__3069b(line=0.2);
// main file
use <../lib.scad>
use <3069b.scad>
$fa=1; $fs=0.2;
function ldraw_lib__63286(realsolid=false) = [
// 0 =Tile  1 x  2 with Groove
// 0 Name: 63286.dat
// 0 Author: Rolf Osterthun [Rolf]
// 0 !LDRAW_ORG Part Alias UPDATE 2013-02
// 0 !LICENSE Licensed under CC BY 2.0 and CC BY 4.0 : see CAreadme.txt
// 
// 0 BFC CERTIFY CCW
  [0,"BFC","CERTIFY"],
  [0,"BFC","CCW"],
// 
// 0 !HISTORY 2013-12-23 [PTadmin] Official Update 2013-02
// 
// 
// 0 // Alias of 3069b
// 0 // Part 63286 is the metallic lacquered counterpart of 3069b
// 
// 1 16 0 0 0 1 0 0 0 1 0 0 0 1 3069b.dat
  [1,16,0,0,0,1,0,0,0,1,0,0,0,1, ldraw_lib__3069b(realsolid)],
];
module ldraw_lib__63286(step=0, col=false, unit=2/5, alt=false, line=0.2, solid=!$preview)
    makepoly(ldraw_lib__63286(solid), step=step, col=col, unit=unit, alt=alt, line=line, solid=solid);
ldraw_lib__63286(line=0.2);
